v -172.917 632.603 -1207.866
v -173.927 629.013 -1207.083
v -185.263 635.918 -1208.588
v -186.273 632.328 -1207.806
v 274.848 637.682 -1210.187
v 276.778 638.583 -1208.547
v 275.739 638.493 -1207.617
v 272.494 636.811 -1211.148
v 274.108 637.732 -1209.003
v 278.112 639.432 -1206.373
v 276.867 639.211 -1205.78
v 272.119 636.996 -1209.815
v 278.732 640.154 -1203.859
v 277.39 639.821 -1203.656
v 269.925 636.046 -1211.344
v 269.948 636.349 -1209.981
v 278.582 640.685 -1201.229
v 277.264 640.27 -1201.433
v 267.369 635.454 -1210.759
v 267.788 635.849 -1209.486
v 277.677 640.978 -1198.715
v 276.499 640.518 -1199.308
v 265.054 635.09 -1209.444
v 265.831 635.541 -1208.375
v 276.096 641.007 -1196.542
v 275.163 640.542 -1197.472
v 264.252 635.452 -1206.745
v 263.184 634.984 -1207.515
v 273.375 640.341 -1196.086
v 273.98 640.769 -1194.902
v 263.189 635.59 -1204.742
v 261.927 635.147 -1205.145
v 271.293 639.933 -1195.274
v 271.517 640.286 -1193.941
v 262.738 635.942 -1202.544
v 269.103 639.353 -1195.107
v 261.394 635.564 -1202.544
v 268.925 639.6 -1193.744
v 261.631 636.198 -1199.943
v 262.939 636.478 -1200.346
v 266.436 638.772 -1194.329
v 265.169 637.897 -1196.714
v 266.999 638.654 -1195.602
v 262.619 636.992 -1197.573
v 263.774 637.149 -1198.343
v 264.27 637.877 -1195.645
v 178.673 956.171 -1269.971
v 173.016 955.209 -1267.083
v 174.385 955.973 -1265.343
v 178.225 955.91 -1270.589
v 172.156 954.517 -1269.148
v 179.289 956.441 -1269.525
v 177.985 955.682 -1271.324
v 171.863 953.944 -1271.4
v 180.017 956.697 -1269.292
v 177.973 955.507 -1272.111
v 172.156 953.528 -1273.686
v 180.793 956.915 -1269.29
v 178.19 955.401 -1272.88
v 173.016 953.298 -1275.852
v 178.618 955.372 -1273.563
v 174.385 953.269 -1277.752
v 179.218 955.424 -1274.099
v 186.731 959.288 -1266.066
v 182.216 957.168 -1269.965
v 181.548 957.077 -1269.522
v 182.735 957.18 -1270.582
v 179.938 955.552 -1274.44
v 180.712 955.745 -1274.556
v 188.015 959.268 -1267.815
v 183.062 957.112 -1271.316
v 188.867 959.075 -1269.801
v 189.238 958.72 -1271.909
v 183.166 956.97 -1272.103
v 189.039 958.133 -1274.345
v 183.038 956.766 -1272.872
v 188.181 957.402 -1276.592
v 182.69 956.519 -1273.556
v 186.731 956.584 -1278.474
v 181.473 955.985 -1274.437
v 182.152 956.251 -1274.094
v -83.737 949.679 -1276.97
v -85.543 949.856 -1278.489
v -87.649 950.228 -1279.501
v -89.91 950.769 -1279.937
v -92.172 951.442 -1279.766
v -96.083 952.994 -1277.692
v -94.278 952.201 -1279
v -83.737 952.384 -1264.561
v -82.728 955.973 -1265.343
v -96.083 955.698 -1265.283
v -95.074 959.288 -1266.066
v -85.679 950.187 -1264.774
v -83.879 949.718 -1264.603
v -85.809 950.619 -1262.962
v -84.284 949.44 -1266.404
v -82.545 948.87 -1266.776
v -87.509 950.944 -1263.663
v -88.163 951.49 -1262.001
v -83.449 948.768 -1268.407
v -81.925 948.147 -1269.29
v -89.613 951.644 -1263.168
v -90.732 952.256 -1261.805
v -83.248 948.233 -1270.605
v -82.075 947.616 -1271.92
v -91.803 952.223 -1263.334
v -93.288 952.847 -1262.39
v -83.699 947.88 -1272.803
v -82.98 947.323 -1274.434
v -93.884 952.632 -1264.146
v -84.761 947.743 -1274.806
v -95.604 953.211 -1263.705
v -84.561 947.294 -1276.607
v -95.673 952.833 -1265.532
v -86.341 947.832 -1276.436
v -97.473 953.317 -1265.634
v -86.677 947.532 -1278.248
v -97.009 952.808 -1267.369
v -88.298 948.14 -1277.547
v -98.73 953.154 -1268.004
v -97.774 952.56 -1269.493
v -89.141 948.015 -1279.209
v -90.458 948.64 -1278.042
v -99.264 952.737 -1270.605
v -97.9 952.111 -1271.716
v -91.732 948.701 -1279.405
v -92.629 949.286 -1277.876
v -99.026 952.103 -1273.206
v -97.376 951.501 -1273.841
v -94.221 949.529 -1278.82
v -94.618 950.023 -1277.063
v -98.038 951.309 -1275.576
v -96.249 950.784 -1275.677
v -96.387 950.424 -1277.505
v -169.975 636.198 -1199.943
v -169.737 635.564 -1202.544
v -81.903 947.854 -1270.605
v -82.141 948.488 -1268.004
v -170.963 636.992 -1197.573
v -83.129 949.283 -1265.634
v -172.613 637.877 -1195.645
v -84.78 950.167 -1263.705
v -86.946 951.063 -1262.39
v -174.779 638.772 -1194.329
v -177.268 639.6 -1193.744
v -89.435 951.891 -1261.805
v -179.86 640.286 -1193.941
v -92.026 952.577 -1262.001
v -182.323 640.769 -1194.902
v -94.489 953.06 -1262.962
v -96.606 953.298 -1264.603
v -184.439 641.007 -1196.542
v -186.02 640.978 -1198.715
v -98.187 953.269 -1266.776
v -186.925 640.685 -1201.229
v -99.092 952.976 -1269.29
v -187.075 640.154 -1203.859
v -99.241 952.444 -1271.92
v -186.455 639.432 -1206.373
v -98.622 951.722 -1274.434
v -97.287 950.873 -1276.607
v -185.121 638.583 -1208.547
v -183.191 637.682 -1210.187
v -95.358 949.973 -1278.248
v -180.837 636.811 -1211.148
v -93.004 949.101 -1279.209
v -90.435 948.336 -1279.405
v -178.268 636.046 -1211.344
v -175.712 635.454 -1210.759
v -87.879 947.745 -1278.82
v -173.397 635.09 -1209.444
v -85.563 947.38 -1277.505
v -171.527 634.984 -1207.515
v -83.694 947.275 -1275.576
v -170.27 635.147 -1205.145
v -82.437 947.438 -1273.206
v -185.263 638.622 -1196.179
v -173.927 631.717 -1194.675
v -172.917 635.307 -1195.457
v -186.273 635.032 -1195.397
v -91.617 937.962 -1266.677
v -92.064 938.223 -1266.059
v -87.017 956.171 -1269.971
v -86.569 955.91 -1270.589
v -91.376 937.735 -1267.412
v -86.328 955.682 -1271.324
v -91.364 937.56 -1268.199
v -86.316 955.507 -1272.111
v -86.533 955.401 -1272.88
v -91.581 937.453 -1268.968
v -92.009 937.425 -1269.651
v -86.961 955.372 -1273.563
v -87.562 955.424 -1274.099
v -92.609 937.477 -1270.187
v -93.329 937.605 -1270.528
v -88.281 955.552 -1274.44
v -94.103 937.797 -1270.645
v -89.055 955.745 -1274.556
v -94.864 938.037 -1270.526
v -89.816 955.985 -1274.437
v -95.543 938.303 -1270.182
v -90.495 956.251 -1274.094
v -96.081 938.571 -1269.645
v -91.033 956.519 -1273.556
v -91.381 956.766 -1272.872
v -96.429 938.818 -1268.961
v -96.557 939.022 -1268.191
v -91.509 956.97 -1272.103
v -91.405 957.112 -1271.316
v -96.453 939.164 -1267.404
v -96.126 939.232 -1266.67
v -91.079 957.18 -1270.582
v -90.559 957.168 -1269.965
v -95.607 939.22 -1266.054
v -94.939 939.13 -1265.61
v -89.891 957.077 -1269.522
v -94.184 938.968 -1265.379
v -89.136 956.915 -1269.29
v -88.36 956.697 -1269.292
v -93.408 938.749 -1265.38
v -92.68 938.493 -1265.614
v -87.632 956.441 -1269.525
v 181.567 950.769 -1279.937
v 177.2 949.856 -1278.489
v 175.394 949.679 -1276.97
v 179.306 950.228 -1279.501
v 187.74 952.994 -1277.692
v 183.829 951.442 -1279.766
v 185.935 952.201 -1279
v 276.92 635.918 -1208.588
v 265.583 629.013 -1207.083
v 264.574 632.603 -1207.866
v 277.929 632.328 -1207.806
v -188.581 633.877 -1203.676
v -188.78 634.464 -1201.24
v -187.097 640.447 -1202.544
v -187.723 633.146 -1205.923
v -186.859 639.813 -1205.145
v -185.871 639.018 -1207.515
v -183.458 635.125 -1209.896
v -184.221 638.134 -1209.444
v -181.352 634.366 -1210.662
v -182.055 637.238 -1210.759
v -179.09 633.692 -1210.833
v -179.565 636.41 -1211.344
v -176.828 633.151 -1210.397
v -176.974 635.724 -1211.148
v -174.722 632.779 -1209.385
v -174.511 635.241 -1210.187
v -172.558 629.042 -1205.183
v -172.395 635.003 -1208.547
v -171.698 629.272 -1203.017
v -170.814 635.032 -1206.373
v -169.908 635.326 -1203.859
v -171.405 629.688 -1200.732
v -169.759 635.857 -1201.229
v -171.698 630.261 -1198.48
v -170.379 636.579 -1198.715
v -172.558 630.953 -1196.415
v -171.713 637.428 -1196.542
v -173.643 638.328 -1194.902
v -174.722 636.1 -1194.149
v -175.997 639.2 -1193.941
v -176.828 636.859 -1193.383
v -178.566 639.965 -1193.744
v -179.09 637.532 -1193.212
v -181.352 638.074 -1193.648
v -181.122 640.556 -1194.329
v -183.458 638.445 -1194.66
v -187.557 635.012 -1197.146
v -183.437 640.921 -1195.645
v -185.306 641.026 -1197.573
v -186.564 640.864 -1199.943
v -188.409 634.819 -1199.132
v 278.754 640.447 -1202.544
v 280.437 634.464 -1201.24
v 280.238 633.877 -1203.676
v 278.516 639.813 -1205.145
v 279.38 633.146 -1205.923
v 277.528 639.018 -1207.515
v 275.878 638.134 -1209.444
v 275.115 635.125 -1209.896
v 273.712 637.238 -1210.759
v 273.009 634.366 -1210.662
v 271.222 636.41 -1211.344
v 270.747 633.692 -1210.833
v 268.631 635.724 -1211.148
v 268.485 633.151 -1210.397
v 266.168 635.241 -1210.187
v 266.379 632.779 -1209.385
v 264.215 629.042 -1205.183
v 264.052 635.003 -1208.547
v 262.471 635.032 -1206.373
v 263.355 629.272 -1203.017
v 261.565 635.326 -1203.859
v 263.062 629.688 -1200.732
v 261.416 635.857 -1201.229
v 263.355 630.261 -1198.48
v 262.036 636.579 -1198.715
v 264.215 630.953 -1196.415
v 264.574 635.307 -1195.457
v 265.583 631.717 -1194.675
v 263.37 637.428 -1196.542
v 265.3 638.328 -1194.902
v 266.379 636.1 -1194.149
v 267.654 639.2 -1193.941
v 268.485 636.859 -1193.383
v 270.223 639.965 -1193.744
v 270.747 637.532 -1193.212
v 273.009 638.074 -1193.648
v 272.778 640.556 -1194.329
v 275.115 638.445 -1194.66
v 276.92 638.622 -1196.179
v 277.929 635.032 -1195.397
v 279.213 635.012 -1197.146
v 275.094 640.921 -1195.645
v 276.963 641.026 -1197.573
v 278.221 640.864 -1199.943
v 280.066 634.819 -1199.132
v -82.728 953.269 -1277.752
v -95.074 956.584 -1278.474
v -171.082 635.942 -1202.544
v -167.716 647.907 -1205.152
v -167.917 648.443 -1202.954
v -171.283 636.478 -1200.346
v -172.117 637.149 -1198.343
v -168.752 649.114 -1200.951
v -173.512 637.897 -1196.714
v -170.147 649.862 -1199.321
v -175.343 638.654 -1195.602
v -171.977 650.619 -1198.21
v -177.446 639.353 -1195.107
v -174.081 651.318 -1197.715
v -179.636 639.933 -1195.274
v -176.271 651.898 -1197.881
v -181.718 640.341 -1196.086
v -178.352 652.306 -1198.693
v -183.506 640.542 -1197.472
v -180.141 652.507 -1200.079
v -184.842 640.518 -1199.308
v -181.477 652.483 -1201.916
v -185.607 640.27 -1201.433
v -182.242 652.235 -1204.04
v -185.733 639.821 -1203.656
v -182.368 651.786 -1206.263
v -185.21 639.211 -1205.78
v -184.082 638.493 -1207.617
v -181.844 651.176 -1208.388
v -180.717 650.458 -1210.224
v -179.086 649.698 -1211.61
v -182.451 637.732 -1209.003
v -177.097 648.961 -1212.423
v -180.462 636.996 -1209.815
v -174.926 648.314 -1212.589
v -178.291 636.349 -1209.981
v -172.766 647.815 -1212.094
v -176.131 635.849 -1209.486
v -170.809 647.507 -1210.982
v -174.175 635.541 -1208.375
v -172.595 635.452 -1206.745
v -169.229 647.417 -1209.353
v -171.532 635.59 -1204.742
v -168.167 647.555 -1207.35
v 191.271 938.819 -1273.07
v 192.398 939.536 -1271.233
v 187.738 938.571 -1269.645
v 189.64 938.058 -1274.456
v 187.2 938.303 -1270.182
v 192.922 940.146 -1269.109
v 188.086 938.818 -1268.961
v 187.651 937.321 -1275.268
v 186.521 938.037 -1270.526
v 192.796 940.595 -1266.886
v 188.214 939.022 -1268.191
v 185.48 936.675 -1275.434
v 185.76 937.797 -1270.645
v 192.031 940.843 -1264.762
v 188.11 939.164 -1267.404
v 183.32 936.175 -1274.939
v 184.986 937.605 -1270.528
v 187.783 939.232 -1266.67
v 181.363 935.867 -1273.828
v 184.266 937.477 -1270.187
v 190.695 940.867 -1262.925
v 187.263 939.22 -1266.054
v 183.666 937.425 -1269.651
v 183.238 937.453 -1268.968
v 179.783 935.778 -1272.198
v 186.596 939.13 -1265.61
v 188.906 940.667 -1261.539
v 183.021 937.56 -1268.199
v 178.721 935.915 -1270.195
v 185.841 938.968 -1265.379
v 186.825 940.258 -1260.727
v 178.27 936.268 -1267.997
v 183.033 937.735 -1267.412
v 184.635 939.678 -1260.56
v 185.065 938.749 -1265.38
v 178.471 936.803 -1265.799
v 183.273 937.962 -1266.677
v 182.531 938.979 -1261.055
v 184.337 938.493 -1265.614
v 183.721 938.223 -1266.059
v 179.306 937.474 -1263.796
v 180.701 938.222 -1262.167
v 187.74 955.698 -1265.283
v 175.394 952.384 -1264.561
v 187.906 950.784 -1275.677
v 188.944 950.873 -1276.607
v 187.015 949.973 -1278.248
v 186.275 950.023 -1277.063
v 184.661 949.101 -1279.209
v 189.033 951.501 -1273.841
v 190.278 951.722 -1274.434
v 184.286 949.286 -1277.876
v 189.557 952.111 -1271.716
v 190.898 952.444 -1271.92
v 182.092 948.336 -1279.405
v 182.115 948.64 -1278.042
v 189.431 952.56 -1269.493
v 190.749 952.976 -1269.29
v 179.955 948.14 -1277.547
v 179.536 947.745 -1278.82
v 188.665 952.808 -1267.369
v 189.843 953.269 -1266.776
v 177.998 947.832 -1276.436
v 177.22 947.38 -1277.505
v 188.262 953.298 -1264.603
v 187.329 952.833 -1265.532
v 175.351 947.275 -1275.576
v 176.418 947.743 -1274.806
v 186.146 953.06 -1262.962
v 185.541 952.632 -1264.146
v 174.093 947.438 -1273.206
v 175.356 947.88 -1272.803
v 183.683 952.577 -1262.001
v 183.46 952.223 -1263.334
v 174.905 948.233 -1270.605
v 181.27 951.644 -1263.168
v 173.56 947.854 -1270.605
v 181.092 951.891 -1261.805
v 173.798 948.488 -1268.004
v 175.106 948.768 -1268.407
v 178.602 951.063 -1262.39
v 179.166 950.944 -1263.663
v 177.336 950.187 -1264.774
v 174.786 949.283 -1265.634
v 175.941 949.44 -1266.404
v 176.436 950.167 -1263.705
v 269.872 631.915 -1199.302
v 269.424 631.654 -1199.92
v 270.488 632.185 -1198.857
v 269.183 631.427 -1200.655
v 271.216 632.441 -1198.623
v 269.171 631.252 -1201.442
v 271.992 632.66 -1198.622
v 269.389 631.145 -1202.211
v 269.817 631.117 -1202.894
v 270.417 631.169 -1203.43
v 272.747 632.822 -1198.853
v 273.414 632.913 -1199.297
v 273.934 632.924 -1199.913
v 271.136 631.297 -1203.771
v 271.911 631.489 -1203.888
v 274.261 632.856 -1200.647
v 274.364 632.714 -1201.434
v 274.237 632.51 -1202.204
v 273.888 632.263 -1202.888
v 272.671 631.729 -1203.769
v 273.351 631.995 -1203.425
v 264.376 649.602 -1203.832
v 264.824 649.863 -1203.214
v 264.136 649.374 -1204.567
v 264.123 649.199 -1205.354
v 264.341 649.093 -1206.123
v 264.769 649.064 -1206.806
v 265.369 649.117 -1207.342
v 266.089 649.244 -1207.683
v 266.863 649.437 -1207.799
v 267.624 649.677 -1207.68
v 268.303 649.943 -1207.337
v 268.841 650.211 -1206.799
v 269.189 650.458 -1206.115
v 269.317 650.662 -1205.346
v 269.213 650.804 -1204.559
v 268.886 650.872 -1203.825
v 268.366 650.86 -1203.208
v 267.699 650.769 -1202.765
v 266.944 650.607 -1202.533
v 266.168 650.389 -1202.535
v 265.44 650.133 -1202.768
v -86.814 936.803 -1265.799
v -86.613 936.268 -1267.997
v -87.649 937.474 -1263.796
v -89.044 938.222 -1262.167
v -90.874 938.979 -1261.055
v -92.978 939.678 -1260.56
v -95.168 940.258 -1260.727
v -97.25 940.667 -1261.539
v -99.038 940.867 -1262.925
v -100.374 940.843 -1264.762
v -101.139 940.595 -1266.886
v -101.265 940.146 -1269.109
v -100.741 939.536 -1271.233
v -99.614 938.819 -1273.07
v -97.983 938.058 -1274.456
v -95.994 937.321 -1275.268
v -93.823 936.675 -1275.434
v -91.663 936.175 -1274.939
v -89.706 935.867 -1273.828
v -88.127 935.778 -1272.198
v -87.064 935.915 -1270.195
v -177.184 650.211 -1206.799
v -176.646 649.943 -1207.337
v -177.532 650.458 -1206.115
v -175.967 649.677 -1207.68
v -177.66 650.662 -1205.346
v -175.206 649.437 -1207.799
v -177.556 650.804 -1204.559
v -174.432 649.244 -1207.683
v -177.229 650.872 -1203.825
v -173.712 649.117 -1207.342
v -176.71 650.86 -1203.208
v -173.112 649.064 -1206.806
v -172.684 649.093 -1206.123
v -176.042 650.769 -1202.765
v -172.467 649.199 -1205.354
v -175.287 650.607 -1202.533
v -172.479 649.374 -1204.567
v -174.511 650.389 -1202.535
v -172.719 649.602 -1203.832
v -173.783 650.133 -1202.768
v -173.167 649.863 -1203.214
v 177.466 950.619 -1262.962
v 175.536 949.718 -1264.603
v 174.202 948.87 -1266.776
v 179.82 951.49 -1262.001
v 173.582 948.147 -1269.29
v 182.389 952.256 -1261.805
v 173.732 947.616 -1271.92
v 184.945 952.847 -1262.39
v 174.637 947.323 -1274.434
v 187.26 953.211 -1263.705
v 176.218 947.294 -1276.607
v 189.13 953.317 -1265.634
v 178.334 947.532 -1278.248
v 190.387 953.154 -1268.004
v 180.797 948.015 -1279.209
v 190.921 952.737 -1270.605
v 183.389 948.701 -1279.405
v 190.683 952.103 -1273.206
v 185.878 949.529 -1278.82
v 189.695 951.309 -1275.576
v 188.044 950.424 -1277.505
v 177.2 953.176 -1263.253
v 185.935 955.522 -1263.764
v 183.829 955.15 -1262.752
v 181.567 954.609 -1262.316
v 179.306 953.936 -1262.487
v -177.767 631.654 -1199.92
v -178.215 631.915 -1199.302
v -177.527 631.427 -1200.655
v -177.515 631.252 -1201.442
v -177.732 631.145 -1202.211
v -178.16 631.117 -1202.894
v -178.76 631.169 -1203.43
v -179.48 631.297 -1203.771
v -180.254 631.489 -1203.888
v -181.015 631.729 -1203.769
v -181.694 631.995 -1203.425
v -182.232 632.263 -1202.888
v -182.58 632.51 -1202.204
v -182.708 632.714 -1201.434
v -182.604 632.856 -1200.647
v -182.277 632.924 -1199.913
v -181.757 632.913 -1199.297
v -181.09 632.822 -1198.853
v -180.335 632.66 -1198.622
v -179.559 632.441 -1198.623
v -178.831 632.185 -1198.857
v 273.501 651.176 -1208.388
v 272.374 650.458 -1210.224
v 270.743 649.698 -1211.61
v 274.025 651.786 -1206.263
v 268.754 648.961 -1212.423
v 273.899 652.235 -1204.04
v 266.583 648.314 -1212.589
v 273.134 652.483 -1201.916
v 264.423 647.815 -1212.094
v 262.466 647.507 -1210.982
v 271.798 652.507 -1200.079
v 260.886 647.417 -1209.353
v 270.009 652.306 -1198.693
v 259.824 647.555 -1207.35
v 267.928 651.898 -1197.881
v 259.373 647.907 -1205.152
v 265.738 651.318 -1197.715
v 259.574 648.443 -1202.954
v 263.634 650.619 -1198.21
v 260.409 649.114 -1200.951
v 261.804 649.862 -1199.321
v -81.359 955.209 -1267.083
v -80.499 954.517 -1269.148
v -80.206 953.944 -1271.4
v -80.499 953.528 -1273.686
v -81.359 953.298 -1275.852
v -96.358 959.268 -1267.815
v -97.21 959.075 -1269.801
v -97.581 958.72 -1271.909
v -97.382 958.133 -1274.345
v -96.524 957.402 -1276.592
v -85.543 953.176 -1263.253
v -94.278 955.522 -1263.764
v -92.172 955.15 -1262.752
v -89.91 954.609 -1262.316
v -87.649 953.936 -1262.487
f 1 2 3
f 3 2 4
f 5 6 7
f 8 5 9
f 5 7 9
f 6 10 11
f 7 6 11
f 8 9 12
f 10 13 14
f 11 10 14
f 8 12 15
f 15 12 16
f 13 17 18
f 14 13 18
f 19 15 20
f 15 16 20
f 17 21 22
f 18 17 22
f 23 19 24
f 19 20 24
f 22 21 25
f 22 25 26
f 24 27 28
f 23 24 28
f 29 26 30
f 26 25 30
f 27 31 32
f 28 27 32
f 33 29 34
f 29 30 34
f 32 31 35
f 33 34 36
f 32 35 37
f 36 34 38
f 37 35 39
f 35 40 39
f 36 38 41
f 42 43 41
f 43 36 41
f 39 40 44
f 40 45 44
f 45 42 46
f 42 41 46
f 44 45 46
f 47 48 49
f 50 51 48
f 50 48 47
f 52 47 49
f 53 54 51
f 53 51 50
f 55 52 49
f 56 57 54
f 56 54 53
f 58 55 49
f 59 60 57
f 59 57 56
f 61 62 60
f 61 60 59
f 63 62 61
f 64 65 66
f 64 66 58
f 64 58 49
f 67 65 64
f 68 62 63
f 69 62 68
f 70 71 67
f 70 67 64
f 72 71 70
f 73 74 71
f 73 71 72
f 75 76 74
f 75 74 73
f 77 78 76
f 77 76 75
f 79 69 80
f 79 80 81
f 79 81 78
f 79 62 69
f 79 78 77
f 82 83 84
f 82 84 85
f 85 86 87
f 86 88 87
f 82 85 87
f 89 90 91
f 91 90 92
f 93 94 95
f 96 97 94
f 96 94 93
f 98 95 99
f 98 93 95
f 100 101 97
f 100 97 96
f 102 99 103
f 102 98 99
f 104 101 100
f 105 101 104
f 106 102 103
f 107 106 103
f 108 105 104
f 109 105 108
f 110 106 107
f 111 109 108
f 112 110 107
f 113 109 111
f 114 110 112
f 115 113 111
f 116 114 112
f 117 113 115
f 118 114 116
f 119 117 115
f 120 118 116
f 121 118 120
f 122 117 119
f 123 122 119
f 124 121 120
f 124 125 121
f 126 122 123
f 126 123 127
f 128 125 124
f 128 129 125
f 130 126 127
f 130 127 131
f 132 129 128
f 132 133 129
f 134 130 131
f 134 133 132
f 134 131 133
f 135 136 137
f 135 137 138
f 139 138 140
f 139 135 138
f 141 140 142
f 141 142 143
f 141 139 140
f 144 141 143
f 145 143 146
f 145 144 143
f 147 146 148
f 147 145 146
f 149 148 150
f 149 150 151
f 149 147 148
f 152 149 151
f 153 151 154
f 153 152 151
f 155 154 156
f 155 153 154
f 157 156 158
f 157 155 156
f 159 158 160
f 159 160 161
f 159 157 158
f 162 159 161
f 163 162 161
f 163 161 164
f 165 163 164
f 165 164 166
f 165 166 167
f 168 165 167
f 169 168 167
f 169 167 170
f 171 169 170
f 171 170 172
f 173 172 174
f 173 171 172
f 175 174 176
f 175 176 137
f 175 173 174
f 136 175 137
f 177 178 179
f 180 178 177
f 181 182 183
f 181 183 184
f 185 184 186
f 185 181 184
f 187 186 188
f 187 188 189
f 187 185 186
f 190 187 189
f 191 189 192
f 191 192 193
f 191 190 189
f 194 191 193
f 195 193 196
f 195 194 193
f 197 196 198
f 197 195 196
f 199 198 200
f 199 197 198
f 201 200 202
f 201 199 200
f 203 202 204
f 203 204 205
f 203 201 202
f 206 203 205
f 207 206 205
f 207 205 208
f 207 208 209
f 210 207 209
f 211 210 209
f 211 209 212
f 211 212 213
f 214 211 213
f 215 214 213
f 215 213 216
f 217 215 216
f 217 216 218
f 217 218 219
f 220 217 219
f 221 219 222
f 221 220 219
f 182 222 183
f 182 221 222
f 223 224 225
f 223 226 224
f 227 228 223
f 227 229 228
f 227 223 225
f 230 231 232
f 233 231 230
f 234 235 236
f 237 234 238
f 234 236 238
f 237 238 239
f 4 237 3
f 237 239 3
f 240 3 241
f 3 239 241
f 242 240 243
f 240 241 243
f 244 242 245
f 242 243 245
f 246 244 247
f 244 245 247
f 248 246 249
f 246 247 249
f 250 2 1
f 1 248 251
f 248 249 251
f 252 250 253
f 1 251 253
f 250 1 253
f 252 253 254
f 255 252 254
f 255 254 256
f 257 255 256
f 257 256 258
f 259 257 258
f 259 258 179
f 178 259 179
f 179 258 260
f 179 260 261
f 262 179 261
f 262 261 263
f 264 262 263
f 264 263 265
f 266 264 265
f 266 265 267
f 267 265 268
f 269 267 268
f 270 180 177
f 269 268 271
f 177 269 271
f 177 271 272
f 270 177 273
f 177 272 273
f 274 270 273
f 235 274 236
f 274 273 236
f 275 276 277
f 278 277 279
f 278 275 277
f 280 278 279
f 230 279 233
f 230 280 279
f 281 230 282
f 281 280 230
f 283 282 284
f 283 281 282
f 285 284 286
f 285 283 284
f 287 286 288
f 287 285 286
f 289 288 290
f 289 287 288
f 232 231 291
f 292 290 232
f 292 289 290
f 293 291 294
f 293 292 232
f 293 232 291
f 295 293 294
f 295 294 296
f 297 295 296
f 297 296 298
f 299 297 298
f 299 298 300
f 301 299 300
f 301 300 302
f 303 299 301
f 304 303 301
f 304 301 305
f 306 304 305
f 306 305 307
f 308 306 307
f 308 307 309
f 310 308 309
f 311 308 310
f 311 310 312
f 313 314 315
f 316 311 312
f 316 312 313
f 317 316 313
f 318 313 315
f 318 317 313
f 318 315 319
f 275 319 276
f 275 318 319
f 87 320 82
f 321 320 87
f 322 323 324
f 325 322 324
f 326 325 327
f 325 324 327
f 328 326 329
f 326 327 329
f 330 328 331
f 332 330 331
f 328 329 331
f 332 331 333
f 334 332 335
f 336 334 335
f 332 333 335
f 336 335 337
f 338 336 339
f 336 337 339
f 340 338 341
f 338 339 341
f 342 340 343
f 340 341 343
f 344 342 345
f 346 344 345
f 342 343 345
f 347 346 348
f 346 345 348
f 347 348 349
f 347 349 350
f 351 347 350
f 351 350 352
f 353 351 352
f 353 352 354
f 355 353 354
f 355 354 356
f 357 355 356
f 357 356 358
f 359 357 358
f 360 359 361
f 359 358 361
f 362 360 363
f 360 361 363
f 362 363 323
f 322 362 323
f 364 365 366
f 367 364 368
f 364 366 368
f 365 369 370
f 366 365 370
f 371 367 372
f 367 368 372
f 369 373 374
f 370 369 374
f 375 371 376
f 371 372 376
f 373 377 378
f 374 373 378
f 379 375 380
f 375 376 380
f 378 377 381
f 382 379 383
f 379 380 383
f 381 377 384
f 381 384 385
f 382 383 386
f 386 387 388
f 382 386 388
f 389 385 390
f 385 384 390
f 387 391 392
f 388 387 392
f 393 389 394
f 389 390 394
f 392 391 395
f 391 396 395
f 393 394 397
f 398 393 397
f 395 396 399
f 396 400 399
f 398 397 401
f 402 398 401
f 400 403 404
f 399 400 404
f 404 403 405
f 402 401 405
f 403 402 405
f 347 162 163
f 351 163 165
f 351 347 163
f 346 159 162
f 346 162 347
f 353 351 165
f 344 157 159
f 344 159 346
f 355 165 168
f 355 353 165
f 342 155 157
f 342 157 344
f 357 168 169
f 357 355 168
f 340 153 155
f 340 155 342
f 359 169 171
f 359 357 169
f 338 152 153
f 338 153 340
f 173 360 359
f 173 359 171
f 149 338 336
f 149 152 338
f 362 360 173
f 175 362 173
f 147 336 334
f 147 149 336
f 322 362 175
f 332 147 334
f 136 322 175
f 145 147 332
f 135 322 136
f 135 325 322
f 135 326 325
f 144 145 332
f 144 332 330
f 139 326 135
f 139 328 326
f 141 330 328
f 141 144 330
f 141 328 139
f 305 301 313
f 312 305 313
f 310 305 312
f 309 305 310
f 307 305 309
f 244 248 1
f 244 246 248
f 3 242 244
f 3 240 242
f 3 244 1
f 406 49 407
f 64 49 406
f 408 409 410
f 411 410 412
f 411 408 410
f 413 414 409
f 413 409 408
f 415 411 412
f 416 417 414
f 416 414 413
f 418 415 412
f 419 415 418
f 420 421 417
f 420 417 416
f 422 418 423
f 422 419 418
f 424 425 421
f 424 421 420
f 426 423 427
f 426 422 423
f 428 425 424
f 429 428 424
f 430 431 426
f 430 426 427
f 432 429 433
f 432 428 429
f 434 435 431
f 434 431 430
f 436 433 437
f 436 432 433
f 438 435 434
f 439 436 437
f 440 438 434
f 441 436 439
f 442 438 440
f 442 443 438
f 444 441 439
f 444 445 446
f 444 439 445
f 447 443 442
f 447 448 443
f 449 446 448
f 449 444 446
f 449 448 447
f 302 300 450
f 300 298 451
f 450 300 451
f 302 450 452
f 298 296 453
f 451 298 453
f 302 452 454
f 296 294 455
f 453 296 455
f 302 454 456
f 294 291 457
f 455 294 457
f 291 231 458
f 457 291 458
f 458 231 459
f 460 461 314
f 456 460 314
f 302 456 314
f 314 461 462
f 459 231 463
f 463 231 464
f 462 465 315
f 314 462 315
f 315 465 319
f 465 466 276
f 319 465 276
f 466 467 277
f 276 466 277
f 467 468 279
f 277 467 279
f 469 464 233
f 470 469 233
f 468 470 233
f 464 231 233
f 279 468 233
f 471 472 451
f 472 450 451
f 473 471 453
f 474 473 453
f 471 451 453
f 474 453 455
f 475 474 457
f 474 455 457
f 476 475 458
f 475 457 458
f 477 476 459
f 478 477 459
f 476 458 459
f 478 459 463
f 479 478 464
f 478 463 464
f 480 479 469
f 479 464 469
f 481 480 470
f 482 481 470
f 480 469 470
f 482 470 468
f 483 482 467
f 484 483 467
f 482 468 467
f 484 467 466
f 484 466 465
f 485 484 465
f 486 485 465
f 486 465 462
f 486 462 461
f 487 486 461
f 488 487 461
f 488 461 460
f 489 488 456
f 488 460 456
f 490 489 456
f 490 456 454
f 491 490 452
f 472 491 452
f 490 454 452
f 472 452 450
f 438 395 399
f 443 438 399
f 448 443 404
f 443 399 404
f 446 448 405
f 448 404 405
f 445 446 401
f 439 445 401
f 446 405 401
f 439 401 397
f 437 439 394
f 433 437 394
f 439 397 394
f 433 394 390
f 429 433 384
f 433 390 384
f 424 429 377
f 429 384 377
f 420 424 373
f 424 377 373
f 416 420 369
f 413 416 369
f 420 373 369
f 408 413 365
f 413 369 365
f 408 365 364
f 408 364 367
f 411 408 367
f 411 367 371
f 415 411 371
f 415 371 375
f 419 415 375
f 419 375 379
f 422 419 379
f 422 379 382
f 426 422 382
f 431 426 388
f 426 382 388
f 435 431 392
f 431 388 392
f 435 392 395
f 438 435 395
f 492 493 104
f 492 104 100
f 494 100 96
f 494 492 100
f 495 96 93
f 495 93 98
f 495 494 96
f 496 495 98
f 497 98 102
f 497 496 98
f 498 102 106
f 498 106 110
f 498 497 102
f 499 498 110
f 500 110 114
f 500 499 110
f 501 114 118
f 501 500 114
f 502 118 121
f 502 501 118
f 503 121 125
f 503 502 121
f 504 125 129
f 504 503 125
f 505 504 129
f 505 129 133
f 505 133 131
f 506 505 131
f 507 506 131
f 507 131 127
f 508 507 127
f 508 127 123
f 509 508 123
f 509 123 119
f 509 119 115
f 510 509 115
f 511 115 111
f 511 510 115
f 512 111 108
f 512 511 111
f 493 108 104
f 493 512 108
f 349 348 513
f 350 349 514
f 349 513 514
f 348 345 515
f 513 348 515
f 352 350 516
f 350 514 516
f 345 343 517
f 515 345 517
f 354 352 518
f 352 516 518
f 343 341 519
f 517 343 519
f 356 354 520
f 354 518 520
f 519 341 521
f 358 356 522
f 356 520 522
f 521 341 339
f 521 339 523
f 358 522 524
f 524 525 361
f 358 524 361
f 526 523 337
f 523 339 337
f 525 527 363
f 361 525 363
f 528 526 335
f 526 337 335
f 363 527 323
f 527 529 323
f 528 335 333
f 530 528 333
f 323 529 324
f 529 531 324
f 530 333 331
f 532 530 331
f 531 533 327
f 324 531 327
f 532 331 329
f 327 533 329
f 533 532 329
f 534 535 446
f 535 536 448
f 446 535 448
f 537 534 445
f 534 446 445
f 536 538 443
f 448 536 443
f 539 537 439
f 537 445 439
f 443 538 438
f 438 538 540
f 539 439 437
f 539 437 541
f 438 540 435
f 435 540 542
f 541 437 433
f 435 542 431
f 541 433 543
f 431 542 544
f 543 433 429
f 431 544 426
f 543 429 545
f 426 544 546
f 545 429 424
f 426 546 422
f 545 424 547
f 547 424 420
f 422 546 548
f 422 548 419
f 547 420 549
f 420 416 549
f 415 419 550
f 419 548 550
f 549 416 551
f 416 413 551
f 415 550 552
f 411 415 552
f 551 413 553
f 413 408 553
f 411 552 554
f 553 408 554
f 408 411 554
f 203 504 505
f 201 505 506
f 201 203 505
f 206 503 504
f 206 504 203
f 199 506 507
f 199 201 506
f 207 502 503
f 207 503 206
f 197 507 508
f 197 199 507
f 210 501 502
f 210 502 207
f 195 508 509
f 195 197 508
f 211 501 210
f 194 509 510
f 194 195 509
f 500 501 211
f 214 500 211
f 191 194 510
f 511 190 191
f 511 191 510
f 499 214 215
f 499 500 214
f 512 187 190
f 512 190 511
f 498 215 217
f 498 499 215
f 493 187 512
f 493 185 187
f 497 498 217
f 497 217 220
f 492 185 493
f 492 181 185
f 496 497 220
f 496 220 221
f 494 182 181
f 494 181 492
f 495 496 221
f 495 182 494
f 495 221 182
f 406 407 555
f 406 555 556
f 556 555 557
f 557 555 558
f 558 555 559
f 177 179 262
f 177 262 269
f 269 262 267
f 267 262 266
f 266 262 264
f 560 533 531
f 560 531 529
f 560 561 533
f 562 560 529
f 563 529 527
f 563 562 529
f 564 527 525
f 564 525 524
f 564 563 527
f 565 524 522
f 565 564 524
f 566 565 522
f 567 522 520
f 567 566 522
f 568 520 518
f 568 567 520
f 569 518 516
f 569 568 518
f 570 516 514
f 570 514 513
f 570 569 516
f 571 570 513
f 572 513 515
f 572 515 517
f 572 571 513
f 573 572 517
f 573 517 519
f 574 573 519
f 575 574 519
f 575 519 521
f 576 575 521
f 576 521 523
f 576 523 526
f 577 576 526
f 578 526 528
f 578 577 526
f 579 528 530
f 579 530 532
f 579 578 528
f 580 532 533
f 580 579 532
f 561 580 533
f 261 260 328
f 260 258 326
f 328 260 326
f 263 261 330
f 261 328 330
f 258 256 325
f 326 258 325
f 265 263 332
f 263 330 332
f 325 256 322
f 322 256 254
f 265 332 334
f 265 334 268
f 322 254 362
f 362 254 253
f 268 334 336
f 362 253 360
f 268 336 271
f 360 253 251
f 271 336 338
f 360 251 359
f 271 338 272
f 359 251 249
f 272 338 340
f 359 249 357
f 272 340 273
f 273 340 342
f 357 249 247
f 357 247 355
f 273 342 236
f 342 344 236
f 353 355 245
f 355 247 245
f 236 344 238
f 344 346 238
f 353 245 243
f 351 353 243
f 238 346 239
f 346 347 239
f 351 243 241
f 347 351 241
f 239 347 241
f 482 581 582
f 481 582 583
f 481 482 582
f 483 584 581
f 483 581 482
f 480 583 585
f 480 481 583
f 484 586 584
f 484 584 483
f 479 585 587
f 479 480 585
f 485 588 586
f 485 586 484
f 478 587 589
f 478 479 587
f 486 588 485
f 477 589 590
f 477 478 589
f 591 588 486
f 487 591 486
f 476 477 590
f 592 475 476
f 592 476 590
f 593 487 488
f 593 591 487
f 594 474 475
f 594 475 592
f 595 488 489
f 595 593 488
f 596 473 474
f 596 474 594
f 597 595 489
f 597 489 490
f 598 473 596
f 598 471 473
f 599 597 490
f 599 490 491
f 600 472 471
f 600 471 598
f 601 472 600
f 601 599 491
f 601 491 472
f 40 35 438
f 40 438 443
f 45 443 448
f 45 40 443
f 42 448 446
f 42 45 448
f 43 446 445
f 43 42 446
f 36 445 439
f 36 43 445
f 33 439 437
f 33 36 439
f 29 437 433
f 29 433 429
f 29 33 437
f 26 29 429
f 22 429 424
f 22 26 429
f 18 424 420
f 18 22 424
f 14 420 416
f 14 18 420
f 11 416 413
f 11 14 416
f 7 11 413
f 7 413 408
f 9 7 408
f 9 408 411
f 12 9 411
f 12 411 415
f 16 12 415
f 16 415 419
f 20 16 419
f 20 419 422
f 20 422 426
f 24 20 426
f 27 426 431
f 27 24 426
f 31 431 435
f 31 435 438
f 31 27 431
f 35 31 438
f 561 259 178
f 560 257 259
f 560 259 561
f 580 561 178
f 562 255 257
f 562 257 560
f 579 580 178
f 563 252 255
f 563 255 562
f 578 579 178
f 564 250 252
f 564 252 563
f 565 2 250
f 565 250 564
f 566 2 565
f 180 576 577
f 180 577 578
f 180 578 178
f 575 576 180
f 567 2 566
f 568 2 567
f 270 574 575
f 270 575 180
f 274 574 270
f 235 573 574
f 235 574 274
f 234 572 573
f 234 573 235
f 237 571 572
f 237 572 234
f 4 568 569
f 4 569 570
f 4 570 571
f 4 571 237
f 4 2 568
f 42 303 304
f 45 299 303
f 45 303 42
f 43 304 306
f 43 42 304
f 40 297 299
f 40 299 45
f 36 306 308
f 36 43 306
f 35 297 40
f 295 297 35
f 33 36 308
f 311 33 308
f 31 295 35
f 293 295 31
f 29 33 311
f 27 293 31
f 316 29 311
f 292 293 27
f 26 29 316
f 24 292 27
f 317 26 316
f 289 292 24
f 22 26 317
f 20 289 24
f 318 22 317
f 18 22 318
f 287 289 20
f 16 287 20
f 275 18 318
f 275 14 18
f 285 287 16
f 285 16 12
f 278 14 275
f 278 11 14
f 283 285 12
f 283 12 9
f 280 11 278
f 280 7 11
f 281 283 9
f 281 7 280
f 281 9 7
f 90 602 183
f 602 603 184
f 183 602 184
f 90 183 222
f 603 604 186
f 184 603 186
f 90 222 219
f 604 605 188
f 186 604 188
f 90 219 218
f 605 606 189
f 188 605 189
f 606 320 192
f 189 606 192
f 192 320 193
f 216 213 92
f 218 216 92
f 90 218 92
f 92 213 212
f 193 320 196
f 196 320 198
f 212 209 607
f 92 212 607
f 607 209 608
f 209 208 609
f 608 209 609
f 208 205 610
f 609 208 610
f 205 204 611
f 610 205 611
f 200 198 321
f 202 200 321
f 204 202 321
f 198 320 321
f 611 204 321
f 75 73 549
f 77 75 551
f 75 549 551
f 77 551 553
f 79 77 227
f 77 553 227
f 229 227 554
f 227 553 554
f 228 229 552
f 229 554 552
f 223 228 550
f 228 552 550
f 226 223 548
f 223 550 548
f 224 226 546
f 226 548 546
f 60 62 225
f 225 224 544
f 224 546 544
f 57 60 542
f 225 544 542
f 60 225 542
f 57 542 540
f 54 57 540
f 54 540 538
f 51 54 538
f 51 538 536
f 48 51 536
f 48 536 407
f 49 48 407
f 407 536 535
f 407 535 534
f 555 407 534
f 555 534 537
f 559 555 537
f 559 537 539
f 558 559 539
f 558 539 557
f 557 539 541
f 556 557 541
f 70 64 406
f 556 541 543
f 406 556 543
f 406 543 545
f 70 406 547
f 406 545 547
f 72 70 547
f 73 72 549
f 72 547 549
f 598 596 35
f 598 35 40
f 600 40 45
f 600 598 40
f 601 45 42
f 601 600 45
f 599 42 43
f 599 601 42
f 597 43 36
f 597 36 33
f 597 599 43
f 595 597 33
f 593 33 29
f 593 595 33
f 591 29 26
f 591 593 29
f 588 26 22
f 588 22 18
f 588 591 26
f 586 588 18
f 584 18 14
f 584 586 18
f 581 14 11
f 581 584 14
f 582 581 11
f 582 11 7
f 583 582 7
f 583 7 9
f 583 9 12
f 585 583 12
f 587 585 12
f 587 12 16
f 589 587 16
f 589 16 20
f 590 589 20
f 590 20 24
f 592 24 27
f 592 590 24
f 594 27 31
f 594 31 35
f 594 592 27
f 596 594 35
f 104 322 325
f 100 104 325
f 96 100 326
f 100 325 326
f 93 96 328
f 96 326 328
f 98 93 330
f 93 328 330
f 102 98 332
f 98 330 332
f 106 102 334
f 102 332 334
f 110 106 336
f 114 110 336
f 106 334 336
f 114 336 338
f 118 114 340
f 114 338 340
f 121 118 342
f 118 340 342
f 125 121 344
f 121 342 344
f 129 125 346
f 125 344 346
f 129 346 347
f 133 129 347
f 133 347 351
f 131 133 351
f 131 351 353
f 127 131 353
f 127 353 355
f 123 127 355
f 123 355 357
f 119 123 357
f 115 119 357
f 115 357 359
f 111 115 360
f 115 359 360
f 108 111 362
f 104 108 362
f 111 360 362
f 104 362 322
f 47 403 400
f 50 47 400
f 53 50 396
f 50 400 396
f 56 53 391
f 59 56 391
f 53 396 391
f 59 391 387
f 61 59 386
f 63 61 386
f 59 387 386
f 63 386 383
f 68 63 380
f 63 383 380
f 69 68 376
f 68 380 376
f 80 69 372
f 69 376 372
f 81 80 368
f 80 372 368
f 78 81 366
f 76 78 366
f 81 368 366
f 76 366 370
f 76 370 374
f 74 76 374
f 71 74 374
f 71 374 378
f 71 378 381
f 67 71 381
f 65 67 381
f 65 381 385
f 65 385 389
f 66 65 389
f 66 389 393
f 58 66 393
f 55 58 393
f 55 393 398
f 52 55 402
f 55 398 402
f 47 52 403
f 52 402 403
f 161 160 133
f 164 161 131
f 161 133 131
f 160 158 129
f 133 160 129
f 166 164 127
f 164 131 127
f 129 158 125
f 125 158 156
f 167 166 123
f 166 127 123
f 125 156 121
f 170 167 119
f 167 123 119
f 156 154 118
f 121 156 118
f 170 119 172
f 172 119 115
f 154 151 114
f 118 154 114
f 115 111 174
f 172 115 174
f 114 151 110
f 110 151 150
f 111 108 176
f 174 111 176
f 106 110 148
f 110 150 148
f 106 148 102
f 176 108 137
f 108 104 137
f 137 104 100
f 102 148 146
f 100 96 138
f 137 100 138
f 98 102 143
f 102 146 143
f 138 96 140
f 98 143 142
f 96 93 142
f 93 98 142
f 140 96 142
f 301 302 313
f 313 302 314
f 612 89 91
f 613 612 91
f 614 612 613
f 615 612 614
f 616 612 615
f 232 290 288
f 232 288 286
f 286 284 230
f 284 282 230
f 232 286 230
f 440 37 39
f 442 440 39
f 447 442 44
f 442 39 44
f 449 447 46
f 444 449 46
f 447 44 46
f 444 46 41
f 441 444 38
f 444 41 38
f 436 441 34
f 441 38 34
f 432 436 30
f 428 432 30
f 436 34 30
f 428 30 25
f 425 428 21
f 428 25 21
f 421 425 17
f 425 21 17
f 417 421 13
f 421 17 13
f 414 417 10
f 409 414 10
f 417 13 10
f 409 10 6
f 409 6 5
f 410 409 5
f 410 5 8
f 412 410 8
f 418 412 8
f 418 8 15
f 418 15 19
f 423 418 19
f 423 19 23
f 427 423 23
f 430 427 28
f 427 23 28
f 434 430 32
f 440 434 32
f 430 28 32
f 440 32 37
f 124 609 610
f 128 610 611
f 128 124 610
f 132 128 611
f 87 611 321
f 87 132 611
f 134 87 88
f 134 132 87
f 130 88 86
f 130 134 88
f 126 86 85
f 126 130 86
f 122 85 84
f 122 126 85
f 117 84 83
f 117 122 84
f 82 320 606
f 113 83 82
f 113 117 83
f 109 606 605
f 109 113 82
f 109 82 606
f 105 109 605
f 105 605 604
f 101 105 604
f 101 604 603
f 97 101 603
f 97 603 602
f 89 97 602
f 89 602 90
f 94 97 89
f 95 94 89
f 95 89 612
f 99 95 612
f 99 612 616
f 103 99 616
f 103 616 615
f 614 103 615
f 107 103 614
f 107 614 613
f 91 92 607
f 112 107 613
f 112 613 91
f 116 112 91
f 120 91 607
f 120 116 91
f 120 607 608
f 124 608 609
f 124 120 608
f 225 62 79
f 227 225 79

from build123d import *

# Parameters (mm, degrees)
SKETCH2_R           = 9.017
SKETCH2_R_2         = 7.62
BOSS_EXTRUDE1_DEPTH = 331.47
SKETCH3_R           = 9.017
BOSS_EXTRUDE2_DEPTH = 6.35
BOSS_EXTRUDE3_START = -12.7
SKETCH4_R           = 7.62
BOSS_EXTRUDE3_DEPTH = 12.7
SKETCH7_W           = 12.803716492
SKETCH7_H           = 5.08
CUT_EXTRUDE1_DEPTH  = 3.81
SKETCH5_W           = 2.7051
SKETCH5_H           = 350.973131874


with BuildPart() as part:
    # Sketch2 → Boss-Extrude1 (new body)
    with BuildSketch(Plane(origin=(270.073748387, 638.005269943, -1202.544168583), x_dir=(0.9642534665209616, 0.25890420779705253, -0.056425734264515276), z_dir=(-0.264981607479291, 0.94213814400187, -0.20533013737491812))):
        with Locations(Location((0, 0, 0), (0, 0, 176.694825711))):
            Circle(SKETCH2_R)
        with Locations(Location((0, 0, 0), (0, 0, 176.694825711))):
            Circle(SKETCH2_R_2, mode=Mode.SUBTRACT)
    extrude(amount=BOSS_EXTRUDE1_DEPTH)


with BuildPart() as body_2:
    # Sketch3 → Boss-Extrude2 (new body)
    with BuildSketch(Plane(origin=(-293.576590008, 1043.807176898, -227.487945786), x_dir=(0.9642534665209616, 0.2589042077970525, -0.05642573426451526), z_dir=(-0.2649816074792909, 0.9421381440018699, -0.20533013737491818))):
        with Locations(Location((493.456234781, 1039.105438699, 0), (0, 0, 356.694825711))):
            Circle(SKETCH3_R)
    extrude(amount=BOSS_EXTRUDE2_DEPTH)

    # Sketch4 → Boss-Extrude3 (add)
    with BuildSketch(Plane(origin=(-293.576590008, 1043.807176898, -227.487945786), x_dir=(0.9642534665209616, 0.2589042077970525, -0.05642573426451526), z_dir=(-0.2649816074792909, 0.9421381440018699, -0.20533013737491818)).offset(BOSS_EXTRUDE3_START)):
        with Locations(Location((493.456234781, 1039.105438699, 0), (0, 0, 176.694825711))):
            Circle(SKETCH4_R)
    extrude(amount=BOSS_EXTRUDE3_DEPTH)

    # Sketch7 → Cut-Extrude1 (cut)
    with BuildSketch(Plane(origin=(-295.259223216, 1049.789754113, -228.791792158), x_dir=(0.9642534665209614, 0.25890420779705253, -0.0564257342645153), z_dir=(-0.264981607479291, 0.9421381440018699, -0.20533013737491826))):
        with Locations((493.456234781, 1047.995438699)):
            Rectangle(SKETCH7_W, SKETCH7_H)
        with Locations((493.456234781, 1030.215438699)):
            Rectangle(SKETCH7_W, SKETCH7_H)
    extrude(amount=-CUT_EXTRUDE1_DEPTH, mode=Mode.SUBTRACT)


with BuildPart() as body_3:
    # Mirror1: mirrored copy
    add(body_2.part.mirror(Plane(origin=(-249.659863293, 887.661911602, -193.457555468), x_dir=(-0.05559324808449576, 0.1976609624630484, 0.9786927682810357), z_dir=(-0.26498160747929095, 0.9421381440018699, -0.20533013737491854))))


with BuildPart() as f_1_4_28_tapped_hole1_tool:
    # Sketch5 → 1/4-28 Tapped Hole1 (revolve)
    with BuildSketch(Plane(origin=(180.557661748, 956.27837775, -1271.908795591), x_dir=(-0.6965497765919672, -0.039774746654788216, 0.7164051774367827), z_dir=(0.6667856900289403, 0.3328568568397835, 0.6667856900289403))):
        with Locations((1.35255, 175.486565937)):
            Rectangle(SKETCH5_W, SKETCH5_H)
    revolve(axis=Axis((178.875028541, 962.260954965, -1273.212641964), (0.2649816074792941, -0.9421381440018695, 0.20533013737491645)))


with BuildPart() as body_2_1:
    add(body_2.part)

    # 1/4-28 Tapped Hole1: cut by f_1_4_28_tapped_hole1_tool
    add(f_1_4_28_tapped_hole1_tool.part, mode=Mode.SUBTRACT)


with BuildPart() as body_3_1:
    add(body_3.part)

    # 1/4-28 Tapped Hole1: cut by f_1_4_28_tapped_hole1_tool
    add(f_1_4_28_tapped_hole1_tool.part, mode=Mode.SUBTRACT)


with BuildPart() as body_4:
    # Mirror2: mirrored copy
    add(body_3_1.part.mirror(Plane(origin=(45.828424217, 0, 0), x_dir=(0, 0, 1), z_dir=(1, 0, 0))))


with BuildPart() as body_5:
    # Mirror2 2: mirrored copy
    add(body_2_1.part.mirror(Plane(origin=(45.828424217, 0, 0), x_dir=(0, 0, 1), z_dir=(1, 0, 0))))


with BuildPart() as body_6:
    # Mirror2 3: mirrored copy
    add(part.part.mirror(Plane(origin=(45.828424217, 0, 0), x_dir=(0, 0, 1), z_dir=(1, 0, 0))))


solid = Compound([part.part, body_2_1.part, body_3_1.part, body_4.part, body_5.part, body_6.part])
